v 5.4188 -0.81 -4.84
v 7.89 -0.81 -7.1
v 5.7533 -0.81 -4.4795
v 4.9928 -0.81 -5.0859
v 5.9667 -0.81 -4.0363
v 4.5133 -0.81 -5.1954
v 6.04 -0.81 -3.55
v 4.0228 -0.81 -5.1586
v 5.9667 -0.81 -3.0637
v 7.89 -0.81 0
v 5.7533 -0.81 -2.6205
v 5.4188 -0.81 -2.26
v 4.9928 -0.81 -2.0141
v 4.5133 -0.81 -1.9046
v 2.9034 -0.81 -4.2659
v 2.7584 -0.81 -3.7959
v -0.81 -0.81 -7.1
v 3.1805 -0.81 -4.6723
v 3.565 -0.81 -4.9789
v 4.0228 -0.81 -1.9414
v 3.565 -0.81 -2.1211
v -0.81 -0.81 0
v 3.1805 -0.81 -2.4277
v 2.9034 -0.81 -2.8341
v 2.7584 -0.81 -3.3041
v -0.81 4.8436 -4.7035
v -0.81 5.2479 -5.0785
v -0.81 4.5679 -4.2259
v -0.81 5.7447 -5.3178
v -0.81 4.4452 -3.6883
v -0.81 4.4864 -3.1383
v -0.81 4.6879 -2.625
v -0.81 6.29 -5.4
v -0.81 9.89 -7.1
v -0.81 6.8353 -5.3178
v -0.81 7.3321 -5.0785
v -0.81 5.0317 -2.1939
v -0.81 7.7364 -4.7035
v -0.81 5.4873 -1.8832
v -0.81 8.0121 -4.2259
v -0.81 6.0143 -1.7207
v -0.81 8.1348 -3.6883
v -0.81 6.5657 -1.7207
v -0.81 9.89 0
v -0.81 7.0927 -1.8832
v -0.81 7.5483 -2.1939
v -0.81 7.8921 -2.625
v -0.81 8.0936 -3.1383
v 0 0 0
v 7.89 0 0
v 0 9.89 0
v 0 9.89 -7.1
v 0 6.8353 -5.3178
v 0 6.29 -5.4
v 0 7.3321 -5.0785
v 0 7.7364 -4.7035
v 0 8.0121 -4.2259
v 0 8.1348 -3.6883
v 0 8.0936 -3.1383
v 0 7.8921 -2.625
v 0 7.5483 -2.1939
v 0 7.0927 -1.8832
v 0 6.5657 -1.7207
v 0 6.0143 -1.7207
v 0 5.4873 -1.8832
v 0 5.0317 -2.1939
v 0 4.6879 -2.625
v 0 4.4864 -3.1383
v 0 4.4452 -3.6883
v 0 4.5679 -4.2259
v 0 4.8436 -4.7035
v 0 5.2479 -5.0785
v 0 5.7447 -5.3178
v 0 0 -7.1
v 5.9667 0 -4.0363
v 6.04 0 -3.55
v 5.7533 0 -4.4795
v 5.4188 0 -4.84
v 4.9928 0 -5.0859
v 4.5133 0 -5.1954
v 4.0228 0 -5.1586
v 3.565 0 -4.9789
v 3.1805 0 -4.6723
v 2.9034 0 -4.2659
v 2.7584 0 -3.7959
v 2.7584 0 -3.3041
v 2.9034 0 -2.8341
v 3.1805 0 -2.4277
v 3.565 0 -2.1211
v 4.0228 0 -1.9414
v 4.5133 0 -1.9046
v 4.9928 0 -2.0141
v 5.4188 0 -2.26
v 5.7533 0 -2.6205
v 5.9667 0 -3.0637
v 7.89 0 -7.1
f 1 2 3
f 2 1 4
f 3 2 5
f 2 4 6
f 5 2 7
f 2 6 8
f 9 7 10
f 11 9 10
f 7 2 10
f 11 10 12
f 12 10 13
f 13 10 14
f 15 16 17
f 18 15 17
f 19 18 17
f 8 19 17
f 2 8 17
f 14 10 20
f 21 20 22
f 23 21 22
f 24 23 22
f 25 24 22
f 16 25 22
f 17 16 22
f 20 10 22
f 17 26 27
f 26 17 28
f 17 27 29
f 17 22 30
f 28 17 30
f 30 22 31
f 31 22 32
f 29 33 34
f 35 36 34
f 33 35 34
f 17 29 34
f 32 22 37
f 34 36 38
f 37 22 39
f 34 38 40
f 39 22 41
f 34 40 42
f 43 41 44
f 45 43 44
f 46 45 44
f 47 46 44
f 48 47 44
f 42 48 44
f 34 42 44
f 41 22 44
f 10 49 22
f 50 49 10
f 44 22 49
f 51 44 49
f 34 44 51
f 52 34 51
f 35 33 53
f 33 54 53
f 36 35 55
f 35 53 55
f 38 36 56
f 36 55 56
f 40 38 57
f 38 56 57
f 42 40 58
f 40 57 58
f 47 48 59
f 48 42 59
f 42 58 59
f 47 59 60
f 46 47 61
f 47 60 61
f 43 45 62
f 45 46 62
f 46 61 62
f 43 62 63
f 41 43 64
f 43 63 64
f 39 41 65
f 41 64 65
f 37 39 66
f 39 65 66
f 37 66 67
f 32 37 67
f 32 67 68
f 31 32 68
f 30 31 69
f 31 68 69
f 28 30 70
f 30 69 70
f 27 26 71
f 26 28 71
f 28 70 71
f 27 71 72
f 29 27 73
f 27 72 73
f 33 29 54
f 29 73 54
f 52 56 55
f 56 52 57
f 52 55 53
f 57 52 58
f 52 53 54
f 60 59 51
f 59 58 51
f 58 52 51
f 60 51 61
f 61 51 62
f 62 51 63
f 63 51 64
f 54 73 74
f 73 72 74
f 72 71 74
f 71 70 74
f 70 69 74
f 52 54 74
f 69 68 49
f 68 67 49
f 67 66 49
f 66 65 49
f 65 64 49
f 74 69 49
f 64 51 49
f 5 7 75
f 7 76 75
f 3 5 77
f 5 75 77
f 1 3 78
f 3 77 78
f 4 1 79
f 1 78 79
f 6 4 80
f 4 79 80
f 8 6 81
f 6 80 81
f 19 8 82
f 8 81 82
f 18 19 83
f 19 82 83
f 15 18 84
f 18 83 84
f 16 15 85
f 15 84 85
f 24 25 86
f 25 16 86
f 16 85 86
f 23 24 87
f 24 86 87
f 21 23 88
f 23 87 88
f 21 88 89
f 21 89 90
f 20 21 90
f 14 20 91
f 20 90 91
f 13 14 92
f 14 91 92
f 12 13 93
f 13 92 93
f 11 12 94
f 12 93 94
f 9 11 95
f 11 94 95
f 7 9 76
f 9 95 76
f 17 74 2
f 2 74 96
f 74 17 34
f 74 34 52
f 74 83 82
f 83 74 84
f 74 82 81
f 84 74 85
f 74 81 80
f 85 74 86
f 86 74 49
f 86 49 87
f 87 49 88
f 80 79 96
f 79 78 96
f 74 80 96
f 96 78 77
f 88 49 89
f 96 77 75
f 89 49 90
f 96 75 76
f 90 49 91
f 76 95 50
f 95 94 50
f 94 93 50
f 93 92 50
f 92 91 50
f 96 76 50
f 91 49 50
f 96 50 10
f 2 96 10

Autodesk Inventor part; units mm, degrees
ref_plane "YZ Plane" through (0, 0, 0) normal (1, 0, 0) x (0, 1, 0)
ref_plane "XZ Plane" through (0, 0, 0) normal (0, 1, 0) x (-1, 0, 0)
ref_plane "XY Plane" through (0, 0, 0) normal (0, 0, 1) x (1, 0, 0)
sketch "Sketch1" plane through (0, 0, 0) normal (0, 0, 1) x (1, 0, 0)
  line L0 (0, 0) -> (7.89, 0)
  line L1 (7.89, 0) -> (7.89, -0.81)
  line L2 (7.89, -0.81) -> (-0.81, -0.81)
  line L3 (-0.81, -0.81) -> (-0.81, 9.89)
  line L4 (-0.81, 9.89) -> (0, 9.89)
  line L5 (0, 9.89) -> (0, 0)
  dimension "d0" = 7.89
  dimension "d1" = 0.81
  dimension "d2" = 8.7
  dimension "d3" = 10.7
extrude "Extrusion1" add sketch "Sketch1" against normal blind 7.1
sketch "Sketch2" plane through (0, 0, 0) normal (0, 1, 0) x (1, 0, 0)
  line L0 (0, 0) -> (-0.81, 0) projected
  line L1 (-0.81, 7.1) -> (0, 7.1) projected
  line L2 (-0.81, 0) -> (-0.81, 7.1)
  line L3 (-0.81, 0) -> (-0.81, 7.1) projected
  line L4 (-0.81, 3.55) -> (4.39, 3.55)
  circle A0 centre (4.39, 3.55) radius 1.65
  dimension "d6" = 5.2
  dimension "d7" = 3.3
extrude "Extrusion2" cut sketch "Sketch2" against normal blind 7.1
sketch "Sketch3" plane through (0, 0, 0) normal (1, 0, 0) x (0, 0, -1)
  line L0 (0, -0.81) -> (7.1, -0.81) projected
  line L1 (3.55, -0.81) -> (3.55, 6.29)
  circle A0 centre (3.55, 6.29) radius 1.85
  point P0 (0, 0)
  dimension "d10" = 7.1
  dimension "d11" = 3.7
extrude "Extrusion3" cut sketch "Sketch3" against normal blind 7.1
properties part number "615Bracket"
